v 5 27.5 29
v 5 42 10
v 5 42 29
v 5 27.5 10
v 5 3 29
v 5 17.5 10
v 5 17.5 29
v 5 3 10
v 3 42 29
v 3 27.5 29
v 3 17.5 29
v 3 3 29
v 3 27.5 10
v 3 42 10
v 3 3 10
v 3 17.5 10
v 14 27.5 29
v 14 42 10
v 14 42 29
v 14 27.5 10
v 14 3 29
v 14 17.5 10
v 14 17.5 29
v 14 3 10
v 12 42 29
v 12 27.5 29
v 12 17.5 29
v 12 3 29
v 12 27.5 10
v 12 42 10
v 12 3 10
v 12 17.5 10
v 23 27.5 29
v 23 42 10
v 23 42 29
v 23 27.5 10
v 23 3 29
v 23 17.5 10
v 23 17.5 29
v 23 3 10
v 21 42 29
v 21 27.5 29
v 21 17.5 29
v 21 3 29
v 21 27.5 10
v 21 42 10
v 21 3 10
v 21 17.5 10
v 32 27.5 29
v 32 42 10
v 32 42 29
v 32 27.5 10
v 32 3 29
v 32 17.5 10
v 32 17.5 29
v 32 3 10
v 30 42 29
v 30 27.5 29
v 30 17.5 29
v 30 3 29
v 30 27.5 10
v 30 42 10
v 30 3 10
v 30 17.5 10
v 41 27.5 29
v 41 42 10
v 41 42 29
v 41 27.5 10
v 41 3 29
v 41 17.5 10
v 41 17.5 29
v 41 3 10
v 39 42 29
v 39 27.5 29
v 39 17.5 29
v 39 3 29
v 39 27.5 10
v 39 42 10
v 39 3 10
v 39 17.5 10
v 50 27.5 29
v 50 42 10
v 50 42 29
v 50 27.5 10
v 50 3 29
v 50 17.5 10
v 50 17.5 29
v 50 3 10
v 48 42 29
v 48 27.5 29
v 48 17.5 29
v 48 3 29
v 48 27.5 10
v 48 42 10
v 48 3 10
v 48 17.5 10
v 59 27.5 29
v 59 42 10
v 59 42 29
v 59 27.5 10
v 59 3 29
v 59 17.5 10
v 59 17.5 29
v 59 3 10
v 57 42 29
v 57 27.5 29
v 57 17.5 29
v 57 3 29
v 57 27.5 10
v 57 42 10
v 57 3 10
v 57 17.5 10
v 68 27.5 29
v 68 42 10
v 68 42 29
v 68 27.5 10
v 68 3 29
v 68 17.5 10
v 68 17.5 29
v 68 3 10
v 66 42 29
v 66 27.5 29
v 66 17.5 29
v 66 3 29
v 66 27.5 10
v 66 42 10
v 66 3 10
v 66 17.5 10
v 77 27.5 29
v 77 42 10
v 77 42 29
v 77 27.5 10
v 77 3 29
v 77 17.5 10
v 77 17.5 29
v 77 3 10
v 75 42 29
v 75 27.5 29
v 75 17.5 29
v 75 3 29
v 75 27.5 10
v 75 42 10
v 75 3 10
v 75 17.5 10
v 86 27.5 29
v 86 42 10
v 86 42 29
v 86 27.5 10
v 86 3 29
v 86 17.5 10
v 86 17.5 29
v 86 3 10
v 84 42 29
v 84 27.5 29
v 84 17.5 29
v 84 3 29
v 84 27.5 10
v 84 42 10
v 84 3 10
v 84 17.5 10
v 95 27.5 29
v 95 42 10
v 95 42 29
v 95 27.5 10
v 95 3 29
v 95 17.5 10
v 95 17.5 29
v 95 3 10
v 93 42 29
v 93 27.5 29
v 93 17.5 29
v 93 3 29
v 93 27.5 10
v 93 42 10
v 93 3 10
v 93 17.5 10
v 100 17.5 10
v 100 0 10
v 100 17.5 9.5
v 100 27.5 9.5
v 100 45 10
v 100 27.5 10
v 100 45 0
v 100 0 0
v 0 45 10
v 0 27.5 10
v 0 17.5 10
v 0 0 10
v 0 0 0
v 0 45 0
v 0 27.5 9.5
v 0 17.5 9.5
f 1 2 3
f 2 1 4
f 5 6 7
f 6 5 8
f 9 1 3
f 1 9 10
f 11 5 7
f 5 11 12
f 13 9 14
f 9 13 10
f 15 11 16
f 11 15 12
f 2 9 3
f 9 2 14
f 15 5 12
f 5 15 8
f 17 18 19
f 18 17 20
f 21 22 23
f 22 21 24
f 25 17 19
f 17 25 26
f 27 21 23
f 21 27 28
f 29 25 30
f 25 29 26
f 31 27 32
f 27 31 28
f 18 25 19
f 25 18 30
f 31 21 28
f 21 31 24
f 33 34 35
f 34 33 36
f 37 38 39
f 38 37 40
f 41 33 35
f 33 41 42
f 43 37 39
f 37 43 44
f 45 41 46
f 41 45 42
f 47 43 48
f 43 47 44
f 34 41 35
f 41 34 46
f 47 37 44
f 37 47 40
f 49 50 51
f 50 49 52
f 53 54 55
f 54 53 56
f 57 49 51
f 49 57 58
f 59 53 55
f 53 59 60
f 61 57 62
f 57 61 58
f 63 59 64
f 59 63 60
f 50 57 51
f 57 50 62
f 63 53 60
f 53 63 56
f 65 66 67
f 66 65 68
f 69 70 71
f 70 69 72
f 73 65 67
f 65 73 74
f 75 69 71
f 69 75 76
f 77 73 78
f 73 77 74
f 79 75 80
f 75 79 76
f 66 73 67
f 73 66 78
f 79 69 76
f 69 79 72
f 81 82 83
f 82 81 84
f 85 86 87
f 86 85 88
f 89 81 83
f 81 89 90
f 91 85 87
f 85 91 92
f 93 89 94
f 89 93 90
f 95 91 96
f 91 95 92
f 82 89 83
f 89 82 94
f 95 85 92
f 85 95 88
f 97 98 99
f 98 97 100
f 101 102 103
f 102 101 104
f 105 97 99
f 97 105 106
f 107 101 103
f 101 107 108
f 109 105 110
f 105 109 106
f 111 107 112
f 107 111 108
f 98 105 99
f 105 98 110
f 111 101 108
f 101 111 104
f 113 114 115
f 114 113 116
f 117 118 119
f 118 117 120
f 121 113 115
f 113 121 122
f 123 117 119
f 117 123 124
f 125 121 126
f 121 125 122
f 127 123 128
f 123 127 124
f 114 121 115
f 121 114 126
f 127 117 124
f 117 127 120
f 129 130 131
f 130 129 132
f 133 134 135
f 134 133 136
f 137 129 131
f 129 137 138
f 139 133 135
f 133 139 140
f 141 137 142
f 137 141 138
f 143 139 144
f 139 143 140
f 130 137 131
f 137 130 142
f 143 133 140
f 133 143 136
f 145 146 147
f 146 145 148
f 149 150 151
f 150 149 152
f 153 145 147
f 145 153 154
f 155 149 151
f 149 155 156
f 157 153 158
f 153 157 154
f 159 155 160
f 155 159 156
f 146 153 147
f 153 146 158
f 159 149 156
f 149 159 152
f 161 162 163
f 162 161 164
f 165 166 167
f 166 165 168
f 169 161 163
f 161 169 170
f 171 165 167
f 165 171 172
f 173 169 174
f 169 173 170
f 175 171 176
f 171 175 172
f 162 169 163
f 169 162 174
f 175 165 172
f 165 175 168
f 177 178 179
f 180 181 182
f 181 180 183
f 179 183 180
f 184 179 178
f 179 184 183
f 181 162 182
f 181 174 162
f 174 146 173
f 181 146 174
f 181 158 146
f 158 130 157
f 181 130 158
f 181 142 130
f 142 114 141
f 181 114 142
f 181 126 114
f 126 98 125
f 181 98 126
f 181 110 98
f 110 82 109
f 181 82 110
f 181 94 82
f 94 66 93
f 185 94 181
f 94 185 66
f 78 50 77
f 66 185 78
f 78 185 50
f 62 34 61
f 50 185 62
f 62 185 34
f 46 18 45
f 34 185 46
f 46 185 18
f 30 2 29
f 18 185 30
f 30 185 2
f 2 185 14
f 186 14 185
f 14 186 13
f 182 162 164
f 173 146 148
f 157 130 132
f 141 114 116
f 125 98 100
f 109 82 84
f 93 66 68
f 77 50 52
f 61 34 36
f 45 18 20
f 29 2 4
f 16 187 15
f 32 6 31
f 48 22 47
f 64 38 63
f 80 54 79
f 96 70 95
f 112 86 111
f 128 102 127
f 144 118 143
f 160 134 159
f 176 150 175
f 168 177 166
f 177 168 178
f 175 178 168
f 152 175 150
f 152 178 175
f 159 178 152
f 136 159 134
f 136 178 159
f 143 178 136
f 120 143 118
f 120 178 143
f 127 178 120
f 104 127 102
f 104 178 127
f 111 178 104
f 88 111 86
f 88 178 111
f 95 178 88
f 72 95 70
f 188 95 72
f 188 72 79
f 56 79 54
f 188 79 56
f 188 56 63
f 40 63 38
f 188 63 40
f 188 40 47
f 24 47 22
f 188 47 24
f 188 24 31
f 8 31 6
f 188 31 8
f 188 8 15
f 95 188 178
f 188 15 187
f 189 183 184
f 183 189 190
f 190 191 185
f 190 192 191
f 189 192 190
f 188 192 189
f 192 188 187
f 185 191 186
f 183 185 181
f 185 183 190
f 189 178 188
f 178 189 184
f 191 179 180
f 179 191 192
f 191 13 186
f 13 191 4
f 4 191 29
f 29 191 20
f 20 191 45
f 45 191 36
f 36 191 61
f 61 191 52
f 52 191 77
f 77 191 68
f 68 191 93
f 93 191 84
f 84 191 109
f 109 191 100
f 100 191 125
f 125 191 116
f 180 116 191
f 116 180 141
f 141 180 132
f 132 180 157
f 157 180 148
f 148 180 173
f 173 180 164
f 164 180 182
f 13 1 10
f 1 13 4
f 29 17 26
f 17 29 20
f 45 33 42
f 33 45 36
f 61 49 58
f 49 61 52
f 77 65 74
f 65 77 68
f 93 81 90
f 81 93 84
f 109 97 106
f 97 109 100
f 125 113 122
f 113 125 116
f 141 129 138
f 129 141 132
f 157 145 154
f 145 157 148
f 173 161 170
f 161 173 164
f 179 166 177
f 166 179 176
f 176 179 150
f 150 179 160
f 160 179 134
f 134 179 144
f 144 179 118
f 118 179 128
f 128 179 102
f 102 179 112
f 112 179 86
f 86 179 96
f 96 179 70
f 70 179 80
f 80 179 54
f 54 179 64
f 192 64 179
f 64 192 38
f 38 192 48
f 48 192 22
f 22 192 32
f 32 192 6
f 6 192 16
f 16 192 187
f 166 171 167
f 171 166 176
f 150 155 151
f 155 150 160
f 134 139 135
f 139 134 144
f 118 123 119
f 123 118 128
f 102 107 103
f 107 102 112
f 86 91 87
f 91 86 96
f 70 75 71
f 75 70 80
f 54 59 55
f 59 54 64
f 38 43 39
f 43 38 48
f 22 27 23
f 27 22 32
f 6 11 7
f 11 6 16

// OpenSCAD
$fn = 32;

// ----------------------------------------------------------------------
// Heatsink: slotted fin block
// ----------------------------------------------------------------------

// --- parameters (mm) ---
base_l = 100;             // base length, X
base_w = 45;              // base width, Y
base_t = 10;              // base plate thickness
fin_h = 20;               // fin height above the base
fin_t = 2;                // fin thickness
edge = 3;                 // margin from the base ends
pitch = 9;                // fin pitch
slot_w = 10;              // central slot width, Y
fit_tol = 0.1;            // tolerance for press fits, mm
free_tol = 0.5;           // tolerance for clearance fits, mm

n_fins = floor((base_l - 2 * edge - fin_t) / pitch) + 1;  // fin count
total_h = base_t + fin_h - 1;  // overall height

difference() {
union() {
  cube([base_l, base_w, base_t]);
  for (i = [0 : n_fins - 1])
    translate([edge + i * pitch, edge, base_t - 1])
      cube([fin_t, base_w - 2 * edge, fin_h]);
}
  translate([-1, base_w / 2 - slot_w / 2, base_t - 0.5])
    cube([base_l + 2, slot_w, fin_h + 2]);
}
